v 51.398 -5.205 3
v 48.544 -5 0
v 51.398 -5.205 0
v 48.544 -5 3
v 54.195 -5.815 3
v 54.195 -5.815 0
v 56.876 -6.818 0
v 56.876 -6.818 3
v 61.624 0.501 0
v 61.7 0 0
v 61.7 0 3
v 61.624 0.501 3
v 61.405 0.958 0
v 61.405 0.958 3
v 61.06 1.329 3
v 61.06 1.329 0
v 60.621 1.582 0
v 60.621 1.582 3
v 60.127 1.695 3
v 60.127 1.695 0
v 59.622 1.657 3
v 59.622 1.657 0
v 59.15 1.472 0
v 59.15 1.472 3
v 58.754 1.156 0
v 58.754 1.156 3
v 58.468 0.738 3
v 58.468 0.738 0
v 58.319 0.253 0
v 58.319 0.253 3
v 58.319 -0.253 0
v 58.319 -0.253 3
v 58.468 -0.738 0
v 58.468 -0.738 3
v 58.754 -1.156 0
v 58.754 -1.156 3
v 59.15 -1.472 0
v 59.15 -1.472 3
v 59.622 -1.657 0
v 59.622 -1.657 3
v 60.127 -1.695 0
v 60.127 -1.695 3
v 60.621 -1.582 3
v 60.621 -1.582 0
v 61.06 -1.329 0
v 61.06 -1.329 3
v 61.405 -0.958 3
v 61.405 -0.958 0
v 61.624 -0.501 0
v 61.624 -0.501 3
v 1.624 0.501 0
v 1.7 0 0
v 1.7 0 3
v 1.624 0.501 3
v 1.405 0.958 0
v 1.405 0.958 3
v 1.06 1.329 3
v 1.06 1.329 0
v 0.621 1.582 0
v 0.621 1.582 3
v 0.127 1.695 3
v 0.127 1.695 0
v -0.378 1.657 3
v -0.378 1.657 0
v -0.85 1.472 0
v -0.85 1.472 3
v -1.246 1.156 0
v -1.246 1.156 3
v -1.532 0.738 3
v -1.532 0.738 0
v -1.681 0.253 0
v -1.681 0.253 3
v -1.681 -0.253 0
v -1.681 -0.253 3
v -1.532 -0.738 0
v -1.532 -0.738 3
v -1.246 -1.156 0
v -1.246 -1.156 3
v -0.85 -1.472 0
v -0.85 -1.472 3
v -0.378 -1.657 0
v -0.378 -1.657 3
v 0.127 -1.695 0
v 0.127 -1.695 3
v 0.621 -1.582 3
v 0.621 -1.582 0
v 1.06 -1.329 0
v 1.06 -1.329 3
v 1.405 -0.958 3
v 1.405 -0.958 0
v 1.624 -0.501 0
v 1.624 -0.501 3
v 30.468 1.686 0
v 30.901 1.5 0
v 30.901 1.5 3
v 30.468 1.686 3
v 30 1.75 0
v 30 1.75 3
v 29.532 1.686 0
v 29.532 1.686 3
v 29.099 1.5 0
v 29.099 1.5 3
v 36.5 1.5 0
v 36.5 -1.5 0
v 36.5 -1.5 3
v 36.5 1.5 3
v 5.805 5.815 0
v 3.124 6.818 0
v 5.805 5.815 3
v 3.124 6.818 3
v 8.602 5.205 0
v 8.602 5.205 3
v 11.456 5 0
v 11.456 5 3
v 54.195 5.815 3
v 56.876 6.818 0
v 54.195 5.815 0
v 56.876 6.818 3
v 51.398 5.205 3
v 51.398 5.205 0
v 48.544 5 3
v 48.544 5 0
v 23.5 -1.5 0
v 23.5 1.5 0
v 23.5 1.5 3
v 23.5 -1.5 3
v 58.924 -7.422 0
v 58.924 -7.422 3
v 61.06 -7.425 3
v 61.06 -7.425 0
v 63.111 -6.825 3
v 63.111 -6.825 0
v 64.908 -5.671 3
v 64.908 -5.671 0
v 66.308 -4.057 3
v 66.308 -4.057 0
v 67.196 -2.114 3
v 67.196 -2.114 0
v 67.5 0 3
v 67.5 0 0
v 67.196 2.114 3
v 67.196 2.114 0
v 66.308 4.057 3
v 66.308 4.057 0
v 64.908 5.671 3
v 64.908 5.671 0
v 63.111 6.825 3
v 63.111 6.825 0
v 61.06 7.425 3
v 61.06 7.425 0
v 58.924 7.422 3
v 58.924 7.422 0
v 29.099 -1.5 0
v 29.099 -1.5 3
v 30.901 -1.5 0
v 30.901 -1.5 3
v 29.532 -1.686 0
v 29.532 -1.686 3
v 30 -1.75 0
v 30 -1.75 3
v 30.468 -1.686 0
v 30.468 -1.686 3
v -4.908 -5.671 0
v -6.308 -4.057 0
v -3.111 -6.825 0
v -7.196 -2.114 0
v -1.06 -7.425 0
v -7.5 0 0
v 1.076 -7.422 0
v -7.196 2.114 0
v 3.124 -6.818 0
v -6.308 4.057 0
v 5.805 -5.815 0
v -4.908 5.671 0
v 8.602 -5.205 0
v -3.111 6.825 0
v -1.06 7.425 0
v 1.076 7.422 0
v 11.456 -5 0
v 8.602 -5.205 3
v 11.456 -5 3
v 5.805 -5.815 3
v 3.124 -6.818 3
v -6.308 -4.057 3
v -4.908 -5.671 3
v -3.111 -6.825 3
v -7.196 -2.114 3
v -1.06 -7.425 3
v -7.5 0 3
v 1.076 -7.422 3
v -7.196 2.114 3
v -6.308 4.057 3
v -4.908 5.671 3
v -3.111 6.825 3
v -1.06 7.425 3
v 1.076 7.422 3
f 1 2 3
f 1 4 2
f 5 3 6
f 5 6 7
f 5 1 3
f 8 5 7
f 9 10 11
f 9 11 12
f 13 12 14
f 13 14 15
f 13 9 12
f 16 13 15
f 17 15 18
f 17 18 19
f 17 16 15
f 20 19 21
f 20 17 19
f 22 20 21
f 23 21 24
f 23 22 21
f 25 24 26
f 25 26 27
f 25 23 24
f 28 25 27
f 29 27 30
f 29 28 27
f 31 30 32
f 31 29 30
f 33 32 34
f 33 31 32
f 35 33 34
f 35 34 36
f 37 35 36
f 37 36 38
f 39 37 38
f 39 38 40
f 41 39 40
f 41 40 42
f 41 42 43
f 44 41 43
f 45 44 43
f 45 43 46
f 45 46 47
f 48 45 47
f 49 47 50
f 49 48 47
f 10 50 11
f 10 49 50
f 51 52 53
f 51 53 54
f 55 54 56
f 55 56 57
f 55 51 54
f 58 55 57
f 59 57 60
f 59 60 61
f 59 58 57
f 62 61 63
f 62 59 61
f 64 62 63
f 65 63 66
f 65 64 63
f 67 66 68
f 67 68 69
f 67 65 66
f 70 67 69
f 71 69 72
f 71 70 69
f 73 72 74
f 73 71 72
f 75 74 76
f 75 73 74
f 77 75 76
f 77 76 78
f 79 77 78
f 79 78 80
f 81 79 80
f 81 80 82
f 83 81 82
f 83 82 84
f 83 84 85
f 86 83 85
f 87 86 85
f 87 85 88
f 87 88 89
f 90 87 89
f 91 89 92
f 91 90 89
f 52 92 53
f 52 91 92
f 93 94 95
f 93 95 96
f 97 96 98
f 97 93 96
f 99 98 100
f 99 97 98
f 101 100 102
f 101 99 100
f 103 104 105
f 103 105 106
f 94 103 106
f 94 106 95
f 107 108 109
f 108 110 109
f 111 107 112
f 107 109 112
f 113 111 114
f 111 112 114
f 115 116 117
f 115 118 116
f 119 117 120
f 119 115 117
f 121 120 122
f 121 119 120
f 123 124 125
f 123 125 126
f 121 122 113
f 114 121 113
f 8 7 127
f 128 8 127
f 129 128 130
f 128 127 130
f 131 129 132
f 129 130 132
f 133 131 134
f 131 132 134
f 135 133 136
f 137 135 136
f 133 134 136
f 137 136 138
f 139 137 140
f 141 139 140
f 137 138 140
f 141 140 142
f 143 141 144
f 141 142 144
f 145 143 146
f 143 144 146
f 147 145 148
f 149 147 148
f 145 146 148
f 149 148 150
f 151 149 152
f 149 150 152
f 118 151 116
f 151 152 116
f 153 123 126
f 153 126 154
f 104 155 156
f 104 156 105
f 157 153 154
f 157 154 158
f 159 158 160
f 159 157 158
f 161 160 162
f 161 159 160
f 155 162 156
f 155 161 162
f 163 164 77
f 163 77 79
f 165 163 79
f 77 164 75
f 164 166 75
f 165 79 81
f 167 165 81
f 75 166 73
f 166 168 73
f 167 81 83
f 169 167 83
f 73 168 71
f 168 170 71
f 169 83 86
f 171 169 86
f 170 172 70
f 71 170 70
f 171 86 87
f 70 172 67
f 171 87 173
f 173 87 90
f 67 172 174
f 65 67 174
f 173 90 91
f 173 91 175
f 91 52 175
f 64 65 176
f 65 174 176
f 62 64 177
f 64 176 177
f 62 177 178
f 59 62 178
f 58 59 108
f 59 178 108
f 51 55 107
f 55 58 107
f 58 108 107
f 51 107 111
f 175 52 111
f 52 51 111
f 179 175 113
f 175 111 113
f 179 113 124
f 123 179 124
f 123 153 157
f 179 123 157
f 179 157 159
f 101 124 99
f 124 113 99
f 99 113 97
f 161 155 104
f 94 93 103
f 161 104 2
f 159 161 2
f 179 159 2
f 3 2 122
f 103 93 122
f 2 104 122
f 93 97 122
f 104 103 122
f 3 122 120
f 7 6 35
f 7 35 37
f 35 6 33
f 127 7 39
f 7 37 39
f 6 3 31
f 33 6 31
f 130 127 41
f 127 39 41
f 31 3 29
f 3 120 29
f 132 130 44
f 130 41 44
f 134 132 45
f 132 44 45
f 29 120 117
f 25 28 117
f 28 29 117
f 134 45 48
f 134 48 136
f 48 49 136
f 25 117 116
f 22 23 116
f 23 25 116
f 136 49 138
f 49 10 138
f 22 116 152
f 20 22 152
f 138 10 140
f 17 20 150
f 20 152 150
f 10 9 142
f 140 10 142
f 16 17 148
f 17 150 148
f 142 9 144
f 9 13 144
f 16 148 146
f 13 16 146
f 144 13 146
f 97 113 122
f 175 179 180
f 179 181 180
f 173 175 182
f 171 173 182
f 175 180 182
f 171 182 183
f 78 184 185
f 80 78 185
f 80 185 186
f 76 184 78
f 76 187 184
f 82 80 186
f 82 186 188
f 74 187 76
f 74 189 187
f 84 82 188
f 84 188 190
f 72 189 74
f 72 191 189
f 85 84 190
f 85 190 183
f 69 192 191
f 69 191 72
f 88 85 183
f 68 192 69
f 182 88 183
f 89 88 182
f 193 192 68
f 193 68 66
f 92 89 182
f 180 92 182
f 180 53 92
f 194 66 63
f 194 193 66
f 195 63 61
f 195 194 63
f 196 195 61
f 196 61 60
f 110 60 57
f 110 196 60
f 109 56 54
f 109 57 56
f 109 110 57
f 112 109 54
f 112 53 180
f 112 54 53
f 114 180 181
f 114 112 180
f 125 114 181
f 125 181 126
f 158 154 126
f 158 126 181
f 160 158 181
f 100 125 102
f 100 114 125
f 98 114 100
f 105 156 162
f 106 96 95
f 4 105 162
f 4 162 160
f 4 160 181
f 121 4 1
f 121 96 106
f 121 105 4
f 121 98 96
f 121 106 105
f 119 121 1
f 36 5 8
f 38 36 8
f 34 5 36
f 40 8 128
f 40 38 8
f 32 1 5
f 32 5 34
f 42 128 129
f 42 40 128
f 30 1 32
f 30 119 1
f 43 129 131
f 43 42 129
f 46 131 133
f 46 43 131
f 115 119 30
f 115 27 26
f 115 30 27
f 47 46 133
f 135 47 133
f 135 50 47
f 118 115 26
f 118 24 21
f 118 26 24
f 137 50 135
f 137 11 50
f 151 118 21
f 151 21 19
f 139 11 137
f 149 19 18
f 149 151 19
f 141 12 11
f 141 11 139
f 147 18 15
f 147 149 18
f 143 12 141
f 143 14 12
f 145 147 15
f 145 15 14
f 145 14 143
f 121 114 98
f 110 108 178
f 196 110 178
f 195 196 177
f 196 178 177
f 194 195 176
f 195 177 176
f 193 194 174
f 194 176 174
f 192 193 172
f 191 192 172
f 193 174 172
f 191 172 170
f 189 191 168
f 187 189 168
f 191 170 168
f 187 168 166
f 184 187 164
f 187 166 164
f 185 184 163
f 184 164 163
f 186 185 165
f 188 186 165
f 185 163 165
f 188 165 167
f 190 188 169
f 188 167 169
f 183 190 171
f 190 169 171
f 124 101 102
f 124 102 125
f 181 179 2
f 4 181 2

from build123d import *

# Parameters (mm, degrees)
ESBO_O1_R                = 1.7
RESSALTO_EXTRUS_O1_DEPTH = 3
FILETE1_R                = 20


with BuildPart() as part:
    # Esboço1 → Ressalto-extrusão1 (new body)
    with BuildSketch(Plane.XY):
        with BuildLine():
            Line((5.590169944, -5), (54.409830056, -5))
            ThreePointArc((54.409830056, -5), (67.5, 0), (54.409830056, 5))
            Line((54.409830056, 5), (5.590169944, 5))
            ThreePointArc((5.590169944, 5), (-7.5, 0), (5.590169944, -5))
        make_face()
        Circle(ESBO_O1_R, mode=Mode.SUBTRACT)
        with Locations((60, 0)):
            Circle(ESBO_O1_R, mode=Mode.SUBTRACT)
        with BuildLine():
            Line((30.901387819, -1.5), (36.5, -1.5))
            Line((36.5, -1.5), (36.5, 1.5))
            Line((36.5, 1.5), (30.901387819, 1.5))
            ThreePointArc((30.901387819, 1.5), (30, 1.75), (29.098612181, 1.5))
            Line((29.098612181, 1.5), (23.5, 1.5))
            Line((23.5, 1.5), (23.5, -1.5))
            Line((23.5, -1.5), (29.098612181, -1.5))
            ThreePointArc((29.098612181, -1.5), (30, -1.75), (30.901387819, -1.5))
        make_face(mode=Mode.SUBTRACT)
    extrude(amount=RESSALTO_EXTRUS_O1_DEPTH)

    # Filete1
    filete1_edges = [part.edges().sort_by_distance(p)[0] for p in [
        (54.409830056, -5, 1.5),
        (5.590169944, -5, 1.5),
        (5.590169944, 5, 1.5),
        (54.409830056, 5, 1.5),
    ]]
    fillet(filete1_edges, radius=FILETE1_R)


solid = part.part
